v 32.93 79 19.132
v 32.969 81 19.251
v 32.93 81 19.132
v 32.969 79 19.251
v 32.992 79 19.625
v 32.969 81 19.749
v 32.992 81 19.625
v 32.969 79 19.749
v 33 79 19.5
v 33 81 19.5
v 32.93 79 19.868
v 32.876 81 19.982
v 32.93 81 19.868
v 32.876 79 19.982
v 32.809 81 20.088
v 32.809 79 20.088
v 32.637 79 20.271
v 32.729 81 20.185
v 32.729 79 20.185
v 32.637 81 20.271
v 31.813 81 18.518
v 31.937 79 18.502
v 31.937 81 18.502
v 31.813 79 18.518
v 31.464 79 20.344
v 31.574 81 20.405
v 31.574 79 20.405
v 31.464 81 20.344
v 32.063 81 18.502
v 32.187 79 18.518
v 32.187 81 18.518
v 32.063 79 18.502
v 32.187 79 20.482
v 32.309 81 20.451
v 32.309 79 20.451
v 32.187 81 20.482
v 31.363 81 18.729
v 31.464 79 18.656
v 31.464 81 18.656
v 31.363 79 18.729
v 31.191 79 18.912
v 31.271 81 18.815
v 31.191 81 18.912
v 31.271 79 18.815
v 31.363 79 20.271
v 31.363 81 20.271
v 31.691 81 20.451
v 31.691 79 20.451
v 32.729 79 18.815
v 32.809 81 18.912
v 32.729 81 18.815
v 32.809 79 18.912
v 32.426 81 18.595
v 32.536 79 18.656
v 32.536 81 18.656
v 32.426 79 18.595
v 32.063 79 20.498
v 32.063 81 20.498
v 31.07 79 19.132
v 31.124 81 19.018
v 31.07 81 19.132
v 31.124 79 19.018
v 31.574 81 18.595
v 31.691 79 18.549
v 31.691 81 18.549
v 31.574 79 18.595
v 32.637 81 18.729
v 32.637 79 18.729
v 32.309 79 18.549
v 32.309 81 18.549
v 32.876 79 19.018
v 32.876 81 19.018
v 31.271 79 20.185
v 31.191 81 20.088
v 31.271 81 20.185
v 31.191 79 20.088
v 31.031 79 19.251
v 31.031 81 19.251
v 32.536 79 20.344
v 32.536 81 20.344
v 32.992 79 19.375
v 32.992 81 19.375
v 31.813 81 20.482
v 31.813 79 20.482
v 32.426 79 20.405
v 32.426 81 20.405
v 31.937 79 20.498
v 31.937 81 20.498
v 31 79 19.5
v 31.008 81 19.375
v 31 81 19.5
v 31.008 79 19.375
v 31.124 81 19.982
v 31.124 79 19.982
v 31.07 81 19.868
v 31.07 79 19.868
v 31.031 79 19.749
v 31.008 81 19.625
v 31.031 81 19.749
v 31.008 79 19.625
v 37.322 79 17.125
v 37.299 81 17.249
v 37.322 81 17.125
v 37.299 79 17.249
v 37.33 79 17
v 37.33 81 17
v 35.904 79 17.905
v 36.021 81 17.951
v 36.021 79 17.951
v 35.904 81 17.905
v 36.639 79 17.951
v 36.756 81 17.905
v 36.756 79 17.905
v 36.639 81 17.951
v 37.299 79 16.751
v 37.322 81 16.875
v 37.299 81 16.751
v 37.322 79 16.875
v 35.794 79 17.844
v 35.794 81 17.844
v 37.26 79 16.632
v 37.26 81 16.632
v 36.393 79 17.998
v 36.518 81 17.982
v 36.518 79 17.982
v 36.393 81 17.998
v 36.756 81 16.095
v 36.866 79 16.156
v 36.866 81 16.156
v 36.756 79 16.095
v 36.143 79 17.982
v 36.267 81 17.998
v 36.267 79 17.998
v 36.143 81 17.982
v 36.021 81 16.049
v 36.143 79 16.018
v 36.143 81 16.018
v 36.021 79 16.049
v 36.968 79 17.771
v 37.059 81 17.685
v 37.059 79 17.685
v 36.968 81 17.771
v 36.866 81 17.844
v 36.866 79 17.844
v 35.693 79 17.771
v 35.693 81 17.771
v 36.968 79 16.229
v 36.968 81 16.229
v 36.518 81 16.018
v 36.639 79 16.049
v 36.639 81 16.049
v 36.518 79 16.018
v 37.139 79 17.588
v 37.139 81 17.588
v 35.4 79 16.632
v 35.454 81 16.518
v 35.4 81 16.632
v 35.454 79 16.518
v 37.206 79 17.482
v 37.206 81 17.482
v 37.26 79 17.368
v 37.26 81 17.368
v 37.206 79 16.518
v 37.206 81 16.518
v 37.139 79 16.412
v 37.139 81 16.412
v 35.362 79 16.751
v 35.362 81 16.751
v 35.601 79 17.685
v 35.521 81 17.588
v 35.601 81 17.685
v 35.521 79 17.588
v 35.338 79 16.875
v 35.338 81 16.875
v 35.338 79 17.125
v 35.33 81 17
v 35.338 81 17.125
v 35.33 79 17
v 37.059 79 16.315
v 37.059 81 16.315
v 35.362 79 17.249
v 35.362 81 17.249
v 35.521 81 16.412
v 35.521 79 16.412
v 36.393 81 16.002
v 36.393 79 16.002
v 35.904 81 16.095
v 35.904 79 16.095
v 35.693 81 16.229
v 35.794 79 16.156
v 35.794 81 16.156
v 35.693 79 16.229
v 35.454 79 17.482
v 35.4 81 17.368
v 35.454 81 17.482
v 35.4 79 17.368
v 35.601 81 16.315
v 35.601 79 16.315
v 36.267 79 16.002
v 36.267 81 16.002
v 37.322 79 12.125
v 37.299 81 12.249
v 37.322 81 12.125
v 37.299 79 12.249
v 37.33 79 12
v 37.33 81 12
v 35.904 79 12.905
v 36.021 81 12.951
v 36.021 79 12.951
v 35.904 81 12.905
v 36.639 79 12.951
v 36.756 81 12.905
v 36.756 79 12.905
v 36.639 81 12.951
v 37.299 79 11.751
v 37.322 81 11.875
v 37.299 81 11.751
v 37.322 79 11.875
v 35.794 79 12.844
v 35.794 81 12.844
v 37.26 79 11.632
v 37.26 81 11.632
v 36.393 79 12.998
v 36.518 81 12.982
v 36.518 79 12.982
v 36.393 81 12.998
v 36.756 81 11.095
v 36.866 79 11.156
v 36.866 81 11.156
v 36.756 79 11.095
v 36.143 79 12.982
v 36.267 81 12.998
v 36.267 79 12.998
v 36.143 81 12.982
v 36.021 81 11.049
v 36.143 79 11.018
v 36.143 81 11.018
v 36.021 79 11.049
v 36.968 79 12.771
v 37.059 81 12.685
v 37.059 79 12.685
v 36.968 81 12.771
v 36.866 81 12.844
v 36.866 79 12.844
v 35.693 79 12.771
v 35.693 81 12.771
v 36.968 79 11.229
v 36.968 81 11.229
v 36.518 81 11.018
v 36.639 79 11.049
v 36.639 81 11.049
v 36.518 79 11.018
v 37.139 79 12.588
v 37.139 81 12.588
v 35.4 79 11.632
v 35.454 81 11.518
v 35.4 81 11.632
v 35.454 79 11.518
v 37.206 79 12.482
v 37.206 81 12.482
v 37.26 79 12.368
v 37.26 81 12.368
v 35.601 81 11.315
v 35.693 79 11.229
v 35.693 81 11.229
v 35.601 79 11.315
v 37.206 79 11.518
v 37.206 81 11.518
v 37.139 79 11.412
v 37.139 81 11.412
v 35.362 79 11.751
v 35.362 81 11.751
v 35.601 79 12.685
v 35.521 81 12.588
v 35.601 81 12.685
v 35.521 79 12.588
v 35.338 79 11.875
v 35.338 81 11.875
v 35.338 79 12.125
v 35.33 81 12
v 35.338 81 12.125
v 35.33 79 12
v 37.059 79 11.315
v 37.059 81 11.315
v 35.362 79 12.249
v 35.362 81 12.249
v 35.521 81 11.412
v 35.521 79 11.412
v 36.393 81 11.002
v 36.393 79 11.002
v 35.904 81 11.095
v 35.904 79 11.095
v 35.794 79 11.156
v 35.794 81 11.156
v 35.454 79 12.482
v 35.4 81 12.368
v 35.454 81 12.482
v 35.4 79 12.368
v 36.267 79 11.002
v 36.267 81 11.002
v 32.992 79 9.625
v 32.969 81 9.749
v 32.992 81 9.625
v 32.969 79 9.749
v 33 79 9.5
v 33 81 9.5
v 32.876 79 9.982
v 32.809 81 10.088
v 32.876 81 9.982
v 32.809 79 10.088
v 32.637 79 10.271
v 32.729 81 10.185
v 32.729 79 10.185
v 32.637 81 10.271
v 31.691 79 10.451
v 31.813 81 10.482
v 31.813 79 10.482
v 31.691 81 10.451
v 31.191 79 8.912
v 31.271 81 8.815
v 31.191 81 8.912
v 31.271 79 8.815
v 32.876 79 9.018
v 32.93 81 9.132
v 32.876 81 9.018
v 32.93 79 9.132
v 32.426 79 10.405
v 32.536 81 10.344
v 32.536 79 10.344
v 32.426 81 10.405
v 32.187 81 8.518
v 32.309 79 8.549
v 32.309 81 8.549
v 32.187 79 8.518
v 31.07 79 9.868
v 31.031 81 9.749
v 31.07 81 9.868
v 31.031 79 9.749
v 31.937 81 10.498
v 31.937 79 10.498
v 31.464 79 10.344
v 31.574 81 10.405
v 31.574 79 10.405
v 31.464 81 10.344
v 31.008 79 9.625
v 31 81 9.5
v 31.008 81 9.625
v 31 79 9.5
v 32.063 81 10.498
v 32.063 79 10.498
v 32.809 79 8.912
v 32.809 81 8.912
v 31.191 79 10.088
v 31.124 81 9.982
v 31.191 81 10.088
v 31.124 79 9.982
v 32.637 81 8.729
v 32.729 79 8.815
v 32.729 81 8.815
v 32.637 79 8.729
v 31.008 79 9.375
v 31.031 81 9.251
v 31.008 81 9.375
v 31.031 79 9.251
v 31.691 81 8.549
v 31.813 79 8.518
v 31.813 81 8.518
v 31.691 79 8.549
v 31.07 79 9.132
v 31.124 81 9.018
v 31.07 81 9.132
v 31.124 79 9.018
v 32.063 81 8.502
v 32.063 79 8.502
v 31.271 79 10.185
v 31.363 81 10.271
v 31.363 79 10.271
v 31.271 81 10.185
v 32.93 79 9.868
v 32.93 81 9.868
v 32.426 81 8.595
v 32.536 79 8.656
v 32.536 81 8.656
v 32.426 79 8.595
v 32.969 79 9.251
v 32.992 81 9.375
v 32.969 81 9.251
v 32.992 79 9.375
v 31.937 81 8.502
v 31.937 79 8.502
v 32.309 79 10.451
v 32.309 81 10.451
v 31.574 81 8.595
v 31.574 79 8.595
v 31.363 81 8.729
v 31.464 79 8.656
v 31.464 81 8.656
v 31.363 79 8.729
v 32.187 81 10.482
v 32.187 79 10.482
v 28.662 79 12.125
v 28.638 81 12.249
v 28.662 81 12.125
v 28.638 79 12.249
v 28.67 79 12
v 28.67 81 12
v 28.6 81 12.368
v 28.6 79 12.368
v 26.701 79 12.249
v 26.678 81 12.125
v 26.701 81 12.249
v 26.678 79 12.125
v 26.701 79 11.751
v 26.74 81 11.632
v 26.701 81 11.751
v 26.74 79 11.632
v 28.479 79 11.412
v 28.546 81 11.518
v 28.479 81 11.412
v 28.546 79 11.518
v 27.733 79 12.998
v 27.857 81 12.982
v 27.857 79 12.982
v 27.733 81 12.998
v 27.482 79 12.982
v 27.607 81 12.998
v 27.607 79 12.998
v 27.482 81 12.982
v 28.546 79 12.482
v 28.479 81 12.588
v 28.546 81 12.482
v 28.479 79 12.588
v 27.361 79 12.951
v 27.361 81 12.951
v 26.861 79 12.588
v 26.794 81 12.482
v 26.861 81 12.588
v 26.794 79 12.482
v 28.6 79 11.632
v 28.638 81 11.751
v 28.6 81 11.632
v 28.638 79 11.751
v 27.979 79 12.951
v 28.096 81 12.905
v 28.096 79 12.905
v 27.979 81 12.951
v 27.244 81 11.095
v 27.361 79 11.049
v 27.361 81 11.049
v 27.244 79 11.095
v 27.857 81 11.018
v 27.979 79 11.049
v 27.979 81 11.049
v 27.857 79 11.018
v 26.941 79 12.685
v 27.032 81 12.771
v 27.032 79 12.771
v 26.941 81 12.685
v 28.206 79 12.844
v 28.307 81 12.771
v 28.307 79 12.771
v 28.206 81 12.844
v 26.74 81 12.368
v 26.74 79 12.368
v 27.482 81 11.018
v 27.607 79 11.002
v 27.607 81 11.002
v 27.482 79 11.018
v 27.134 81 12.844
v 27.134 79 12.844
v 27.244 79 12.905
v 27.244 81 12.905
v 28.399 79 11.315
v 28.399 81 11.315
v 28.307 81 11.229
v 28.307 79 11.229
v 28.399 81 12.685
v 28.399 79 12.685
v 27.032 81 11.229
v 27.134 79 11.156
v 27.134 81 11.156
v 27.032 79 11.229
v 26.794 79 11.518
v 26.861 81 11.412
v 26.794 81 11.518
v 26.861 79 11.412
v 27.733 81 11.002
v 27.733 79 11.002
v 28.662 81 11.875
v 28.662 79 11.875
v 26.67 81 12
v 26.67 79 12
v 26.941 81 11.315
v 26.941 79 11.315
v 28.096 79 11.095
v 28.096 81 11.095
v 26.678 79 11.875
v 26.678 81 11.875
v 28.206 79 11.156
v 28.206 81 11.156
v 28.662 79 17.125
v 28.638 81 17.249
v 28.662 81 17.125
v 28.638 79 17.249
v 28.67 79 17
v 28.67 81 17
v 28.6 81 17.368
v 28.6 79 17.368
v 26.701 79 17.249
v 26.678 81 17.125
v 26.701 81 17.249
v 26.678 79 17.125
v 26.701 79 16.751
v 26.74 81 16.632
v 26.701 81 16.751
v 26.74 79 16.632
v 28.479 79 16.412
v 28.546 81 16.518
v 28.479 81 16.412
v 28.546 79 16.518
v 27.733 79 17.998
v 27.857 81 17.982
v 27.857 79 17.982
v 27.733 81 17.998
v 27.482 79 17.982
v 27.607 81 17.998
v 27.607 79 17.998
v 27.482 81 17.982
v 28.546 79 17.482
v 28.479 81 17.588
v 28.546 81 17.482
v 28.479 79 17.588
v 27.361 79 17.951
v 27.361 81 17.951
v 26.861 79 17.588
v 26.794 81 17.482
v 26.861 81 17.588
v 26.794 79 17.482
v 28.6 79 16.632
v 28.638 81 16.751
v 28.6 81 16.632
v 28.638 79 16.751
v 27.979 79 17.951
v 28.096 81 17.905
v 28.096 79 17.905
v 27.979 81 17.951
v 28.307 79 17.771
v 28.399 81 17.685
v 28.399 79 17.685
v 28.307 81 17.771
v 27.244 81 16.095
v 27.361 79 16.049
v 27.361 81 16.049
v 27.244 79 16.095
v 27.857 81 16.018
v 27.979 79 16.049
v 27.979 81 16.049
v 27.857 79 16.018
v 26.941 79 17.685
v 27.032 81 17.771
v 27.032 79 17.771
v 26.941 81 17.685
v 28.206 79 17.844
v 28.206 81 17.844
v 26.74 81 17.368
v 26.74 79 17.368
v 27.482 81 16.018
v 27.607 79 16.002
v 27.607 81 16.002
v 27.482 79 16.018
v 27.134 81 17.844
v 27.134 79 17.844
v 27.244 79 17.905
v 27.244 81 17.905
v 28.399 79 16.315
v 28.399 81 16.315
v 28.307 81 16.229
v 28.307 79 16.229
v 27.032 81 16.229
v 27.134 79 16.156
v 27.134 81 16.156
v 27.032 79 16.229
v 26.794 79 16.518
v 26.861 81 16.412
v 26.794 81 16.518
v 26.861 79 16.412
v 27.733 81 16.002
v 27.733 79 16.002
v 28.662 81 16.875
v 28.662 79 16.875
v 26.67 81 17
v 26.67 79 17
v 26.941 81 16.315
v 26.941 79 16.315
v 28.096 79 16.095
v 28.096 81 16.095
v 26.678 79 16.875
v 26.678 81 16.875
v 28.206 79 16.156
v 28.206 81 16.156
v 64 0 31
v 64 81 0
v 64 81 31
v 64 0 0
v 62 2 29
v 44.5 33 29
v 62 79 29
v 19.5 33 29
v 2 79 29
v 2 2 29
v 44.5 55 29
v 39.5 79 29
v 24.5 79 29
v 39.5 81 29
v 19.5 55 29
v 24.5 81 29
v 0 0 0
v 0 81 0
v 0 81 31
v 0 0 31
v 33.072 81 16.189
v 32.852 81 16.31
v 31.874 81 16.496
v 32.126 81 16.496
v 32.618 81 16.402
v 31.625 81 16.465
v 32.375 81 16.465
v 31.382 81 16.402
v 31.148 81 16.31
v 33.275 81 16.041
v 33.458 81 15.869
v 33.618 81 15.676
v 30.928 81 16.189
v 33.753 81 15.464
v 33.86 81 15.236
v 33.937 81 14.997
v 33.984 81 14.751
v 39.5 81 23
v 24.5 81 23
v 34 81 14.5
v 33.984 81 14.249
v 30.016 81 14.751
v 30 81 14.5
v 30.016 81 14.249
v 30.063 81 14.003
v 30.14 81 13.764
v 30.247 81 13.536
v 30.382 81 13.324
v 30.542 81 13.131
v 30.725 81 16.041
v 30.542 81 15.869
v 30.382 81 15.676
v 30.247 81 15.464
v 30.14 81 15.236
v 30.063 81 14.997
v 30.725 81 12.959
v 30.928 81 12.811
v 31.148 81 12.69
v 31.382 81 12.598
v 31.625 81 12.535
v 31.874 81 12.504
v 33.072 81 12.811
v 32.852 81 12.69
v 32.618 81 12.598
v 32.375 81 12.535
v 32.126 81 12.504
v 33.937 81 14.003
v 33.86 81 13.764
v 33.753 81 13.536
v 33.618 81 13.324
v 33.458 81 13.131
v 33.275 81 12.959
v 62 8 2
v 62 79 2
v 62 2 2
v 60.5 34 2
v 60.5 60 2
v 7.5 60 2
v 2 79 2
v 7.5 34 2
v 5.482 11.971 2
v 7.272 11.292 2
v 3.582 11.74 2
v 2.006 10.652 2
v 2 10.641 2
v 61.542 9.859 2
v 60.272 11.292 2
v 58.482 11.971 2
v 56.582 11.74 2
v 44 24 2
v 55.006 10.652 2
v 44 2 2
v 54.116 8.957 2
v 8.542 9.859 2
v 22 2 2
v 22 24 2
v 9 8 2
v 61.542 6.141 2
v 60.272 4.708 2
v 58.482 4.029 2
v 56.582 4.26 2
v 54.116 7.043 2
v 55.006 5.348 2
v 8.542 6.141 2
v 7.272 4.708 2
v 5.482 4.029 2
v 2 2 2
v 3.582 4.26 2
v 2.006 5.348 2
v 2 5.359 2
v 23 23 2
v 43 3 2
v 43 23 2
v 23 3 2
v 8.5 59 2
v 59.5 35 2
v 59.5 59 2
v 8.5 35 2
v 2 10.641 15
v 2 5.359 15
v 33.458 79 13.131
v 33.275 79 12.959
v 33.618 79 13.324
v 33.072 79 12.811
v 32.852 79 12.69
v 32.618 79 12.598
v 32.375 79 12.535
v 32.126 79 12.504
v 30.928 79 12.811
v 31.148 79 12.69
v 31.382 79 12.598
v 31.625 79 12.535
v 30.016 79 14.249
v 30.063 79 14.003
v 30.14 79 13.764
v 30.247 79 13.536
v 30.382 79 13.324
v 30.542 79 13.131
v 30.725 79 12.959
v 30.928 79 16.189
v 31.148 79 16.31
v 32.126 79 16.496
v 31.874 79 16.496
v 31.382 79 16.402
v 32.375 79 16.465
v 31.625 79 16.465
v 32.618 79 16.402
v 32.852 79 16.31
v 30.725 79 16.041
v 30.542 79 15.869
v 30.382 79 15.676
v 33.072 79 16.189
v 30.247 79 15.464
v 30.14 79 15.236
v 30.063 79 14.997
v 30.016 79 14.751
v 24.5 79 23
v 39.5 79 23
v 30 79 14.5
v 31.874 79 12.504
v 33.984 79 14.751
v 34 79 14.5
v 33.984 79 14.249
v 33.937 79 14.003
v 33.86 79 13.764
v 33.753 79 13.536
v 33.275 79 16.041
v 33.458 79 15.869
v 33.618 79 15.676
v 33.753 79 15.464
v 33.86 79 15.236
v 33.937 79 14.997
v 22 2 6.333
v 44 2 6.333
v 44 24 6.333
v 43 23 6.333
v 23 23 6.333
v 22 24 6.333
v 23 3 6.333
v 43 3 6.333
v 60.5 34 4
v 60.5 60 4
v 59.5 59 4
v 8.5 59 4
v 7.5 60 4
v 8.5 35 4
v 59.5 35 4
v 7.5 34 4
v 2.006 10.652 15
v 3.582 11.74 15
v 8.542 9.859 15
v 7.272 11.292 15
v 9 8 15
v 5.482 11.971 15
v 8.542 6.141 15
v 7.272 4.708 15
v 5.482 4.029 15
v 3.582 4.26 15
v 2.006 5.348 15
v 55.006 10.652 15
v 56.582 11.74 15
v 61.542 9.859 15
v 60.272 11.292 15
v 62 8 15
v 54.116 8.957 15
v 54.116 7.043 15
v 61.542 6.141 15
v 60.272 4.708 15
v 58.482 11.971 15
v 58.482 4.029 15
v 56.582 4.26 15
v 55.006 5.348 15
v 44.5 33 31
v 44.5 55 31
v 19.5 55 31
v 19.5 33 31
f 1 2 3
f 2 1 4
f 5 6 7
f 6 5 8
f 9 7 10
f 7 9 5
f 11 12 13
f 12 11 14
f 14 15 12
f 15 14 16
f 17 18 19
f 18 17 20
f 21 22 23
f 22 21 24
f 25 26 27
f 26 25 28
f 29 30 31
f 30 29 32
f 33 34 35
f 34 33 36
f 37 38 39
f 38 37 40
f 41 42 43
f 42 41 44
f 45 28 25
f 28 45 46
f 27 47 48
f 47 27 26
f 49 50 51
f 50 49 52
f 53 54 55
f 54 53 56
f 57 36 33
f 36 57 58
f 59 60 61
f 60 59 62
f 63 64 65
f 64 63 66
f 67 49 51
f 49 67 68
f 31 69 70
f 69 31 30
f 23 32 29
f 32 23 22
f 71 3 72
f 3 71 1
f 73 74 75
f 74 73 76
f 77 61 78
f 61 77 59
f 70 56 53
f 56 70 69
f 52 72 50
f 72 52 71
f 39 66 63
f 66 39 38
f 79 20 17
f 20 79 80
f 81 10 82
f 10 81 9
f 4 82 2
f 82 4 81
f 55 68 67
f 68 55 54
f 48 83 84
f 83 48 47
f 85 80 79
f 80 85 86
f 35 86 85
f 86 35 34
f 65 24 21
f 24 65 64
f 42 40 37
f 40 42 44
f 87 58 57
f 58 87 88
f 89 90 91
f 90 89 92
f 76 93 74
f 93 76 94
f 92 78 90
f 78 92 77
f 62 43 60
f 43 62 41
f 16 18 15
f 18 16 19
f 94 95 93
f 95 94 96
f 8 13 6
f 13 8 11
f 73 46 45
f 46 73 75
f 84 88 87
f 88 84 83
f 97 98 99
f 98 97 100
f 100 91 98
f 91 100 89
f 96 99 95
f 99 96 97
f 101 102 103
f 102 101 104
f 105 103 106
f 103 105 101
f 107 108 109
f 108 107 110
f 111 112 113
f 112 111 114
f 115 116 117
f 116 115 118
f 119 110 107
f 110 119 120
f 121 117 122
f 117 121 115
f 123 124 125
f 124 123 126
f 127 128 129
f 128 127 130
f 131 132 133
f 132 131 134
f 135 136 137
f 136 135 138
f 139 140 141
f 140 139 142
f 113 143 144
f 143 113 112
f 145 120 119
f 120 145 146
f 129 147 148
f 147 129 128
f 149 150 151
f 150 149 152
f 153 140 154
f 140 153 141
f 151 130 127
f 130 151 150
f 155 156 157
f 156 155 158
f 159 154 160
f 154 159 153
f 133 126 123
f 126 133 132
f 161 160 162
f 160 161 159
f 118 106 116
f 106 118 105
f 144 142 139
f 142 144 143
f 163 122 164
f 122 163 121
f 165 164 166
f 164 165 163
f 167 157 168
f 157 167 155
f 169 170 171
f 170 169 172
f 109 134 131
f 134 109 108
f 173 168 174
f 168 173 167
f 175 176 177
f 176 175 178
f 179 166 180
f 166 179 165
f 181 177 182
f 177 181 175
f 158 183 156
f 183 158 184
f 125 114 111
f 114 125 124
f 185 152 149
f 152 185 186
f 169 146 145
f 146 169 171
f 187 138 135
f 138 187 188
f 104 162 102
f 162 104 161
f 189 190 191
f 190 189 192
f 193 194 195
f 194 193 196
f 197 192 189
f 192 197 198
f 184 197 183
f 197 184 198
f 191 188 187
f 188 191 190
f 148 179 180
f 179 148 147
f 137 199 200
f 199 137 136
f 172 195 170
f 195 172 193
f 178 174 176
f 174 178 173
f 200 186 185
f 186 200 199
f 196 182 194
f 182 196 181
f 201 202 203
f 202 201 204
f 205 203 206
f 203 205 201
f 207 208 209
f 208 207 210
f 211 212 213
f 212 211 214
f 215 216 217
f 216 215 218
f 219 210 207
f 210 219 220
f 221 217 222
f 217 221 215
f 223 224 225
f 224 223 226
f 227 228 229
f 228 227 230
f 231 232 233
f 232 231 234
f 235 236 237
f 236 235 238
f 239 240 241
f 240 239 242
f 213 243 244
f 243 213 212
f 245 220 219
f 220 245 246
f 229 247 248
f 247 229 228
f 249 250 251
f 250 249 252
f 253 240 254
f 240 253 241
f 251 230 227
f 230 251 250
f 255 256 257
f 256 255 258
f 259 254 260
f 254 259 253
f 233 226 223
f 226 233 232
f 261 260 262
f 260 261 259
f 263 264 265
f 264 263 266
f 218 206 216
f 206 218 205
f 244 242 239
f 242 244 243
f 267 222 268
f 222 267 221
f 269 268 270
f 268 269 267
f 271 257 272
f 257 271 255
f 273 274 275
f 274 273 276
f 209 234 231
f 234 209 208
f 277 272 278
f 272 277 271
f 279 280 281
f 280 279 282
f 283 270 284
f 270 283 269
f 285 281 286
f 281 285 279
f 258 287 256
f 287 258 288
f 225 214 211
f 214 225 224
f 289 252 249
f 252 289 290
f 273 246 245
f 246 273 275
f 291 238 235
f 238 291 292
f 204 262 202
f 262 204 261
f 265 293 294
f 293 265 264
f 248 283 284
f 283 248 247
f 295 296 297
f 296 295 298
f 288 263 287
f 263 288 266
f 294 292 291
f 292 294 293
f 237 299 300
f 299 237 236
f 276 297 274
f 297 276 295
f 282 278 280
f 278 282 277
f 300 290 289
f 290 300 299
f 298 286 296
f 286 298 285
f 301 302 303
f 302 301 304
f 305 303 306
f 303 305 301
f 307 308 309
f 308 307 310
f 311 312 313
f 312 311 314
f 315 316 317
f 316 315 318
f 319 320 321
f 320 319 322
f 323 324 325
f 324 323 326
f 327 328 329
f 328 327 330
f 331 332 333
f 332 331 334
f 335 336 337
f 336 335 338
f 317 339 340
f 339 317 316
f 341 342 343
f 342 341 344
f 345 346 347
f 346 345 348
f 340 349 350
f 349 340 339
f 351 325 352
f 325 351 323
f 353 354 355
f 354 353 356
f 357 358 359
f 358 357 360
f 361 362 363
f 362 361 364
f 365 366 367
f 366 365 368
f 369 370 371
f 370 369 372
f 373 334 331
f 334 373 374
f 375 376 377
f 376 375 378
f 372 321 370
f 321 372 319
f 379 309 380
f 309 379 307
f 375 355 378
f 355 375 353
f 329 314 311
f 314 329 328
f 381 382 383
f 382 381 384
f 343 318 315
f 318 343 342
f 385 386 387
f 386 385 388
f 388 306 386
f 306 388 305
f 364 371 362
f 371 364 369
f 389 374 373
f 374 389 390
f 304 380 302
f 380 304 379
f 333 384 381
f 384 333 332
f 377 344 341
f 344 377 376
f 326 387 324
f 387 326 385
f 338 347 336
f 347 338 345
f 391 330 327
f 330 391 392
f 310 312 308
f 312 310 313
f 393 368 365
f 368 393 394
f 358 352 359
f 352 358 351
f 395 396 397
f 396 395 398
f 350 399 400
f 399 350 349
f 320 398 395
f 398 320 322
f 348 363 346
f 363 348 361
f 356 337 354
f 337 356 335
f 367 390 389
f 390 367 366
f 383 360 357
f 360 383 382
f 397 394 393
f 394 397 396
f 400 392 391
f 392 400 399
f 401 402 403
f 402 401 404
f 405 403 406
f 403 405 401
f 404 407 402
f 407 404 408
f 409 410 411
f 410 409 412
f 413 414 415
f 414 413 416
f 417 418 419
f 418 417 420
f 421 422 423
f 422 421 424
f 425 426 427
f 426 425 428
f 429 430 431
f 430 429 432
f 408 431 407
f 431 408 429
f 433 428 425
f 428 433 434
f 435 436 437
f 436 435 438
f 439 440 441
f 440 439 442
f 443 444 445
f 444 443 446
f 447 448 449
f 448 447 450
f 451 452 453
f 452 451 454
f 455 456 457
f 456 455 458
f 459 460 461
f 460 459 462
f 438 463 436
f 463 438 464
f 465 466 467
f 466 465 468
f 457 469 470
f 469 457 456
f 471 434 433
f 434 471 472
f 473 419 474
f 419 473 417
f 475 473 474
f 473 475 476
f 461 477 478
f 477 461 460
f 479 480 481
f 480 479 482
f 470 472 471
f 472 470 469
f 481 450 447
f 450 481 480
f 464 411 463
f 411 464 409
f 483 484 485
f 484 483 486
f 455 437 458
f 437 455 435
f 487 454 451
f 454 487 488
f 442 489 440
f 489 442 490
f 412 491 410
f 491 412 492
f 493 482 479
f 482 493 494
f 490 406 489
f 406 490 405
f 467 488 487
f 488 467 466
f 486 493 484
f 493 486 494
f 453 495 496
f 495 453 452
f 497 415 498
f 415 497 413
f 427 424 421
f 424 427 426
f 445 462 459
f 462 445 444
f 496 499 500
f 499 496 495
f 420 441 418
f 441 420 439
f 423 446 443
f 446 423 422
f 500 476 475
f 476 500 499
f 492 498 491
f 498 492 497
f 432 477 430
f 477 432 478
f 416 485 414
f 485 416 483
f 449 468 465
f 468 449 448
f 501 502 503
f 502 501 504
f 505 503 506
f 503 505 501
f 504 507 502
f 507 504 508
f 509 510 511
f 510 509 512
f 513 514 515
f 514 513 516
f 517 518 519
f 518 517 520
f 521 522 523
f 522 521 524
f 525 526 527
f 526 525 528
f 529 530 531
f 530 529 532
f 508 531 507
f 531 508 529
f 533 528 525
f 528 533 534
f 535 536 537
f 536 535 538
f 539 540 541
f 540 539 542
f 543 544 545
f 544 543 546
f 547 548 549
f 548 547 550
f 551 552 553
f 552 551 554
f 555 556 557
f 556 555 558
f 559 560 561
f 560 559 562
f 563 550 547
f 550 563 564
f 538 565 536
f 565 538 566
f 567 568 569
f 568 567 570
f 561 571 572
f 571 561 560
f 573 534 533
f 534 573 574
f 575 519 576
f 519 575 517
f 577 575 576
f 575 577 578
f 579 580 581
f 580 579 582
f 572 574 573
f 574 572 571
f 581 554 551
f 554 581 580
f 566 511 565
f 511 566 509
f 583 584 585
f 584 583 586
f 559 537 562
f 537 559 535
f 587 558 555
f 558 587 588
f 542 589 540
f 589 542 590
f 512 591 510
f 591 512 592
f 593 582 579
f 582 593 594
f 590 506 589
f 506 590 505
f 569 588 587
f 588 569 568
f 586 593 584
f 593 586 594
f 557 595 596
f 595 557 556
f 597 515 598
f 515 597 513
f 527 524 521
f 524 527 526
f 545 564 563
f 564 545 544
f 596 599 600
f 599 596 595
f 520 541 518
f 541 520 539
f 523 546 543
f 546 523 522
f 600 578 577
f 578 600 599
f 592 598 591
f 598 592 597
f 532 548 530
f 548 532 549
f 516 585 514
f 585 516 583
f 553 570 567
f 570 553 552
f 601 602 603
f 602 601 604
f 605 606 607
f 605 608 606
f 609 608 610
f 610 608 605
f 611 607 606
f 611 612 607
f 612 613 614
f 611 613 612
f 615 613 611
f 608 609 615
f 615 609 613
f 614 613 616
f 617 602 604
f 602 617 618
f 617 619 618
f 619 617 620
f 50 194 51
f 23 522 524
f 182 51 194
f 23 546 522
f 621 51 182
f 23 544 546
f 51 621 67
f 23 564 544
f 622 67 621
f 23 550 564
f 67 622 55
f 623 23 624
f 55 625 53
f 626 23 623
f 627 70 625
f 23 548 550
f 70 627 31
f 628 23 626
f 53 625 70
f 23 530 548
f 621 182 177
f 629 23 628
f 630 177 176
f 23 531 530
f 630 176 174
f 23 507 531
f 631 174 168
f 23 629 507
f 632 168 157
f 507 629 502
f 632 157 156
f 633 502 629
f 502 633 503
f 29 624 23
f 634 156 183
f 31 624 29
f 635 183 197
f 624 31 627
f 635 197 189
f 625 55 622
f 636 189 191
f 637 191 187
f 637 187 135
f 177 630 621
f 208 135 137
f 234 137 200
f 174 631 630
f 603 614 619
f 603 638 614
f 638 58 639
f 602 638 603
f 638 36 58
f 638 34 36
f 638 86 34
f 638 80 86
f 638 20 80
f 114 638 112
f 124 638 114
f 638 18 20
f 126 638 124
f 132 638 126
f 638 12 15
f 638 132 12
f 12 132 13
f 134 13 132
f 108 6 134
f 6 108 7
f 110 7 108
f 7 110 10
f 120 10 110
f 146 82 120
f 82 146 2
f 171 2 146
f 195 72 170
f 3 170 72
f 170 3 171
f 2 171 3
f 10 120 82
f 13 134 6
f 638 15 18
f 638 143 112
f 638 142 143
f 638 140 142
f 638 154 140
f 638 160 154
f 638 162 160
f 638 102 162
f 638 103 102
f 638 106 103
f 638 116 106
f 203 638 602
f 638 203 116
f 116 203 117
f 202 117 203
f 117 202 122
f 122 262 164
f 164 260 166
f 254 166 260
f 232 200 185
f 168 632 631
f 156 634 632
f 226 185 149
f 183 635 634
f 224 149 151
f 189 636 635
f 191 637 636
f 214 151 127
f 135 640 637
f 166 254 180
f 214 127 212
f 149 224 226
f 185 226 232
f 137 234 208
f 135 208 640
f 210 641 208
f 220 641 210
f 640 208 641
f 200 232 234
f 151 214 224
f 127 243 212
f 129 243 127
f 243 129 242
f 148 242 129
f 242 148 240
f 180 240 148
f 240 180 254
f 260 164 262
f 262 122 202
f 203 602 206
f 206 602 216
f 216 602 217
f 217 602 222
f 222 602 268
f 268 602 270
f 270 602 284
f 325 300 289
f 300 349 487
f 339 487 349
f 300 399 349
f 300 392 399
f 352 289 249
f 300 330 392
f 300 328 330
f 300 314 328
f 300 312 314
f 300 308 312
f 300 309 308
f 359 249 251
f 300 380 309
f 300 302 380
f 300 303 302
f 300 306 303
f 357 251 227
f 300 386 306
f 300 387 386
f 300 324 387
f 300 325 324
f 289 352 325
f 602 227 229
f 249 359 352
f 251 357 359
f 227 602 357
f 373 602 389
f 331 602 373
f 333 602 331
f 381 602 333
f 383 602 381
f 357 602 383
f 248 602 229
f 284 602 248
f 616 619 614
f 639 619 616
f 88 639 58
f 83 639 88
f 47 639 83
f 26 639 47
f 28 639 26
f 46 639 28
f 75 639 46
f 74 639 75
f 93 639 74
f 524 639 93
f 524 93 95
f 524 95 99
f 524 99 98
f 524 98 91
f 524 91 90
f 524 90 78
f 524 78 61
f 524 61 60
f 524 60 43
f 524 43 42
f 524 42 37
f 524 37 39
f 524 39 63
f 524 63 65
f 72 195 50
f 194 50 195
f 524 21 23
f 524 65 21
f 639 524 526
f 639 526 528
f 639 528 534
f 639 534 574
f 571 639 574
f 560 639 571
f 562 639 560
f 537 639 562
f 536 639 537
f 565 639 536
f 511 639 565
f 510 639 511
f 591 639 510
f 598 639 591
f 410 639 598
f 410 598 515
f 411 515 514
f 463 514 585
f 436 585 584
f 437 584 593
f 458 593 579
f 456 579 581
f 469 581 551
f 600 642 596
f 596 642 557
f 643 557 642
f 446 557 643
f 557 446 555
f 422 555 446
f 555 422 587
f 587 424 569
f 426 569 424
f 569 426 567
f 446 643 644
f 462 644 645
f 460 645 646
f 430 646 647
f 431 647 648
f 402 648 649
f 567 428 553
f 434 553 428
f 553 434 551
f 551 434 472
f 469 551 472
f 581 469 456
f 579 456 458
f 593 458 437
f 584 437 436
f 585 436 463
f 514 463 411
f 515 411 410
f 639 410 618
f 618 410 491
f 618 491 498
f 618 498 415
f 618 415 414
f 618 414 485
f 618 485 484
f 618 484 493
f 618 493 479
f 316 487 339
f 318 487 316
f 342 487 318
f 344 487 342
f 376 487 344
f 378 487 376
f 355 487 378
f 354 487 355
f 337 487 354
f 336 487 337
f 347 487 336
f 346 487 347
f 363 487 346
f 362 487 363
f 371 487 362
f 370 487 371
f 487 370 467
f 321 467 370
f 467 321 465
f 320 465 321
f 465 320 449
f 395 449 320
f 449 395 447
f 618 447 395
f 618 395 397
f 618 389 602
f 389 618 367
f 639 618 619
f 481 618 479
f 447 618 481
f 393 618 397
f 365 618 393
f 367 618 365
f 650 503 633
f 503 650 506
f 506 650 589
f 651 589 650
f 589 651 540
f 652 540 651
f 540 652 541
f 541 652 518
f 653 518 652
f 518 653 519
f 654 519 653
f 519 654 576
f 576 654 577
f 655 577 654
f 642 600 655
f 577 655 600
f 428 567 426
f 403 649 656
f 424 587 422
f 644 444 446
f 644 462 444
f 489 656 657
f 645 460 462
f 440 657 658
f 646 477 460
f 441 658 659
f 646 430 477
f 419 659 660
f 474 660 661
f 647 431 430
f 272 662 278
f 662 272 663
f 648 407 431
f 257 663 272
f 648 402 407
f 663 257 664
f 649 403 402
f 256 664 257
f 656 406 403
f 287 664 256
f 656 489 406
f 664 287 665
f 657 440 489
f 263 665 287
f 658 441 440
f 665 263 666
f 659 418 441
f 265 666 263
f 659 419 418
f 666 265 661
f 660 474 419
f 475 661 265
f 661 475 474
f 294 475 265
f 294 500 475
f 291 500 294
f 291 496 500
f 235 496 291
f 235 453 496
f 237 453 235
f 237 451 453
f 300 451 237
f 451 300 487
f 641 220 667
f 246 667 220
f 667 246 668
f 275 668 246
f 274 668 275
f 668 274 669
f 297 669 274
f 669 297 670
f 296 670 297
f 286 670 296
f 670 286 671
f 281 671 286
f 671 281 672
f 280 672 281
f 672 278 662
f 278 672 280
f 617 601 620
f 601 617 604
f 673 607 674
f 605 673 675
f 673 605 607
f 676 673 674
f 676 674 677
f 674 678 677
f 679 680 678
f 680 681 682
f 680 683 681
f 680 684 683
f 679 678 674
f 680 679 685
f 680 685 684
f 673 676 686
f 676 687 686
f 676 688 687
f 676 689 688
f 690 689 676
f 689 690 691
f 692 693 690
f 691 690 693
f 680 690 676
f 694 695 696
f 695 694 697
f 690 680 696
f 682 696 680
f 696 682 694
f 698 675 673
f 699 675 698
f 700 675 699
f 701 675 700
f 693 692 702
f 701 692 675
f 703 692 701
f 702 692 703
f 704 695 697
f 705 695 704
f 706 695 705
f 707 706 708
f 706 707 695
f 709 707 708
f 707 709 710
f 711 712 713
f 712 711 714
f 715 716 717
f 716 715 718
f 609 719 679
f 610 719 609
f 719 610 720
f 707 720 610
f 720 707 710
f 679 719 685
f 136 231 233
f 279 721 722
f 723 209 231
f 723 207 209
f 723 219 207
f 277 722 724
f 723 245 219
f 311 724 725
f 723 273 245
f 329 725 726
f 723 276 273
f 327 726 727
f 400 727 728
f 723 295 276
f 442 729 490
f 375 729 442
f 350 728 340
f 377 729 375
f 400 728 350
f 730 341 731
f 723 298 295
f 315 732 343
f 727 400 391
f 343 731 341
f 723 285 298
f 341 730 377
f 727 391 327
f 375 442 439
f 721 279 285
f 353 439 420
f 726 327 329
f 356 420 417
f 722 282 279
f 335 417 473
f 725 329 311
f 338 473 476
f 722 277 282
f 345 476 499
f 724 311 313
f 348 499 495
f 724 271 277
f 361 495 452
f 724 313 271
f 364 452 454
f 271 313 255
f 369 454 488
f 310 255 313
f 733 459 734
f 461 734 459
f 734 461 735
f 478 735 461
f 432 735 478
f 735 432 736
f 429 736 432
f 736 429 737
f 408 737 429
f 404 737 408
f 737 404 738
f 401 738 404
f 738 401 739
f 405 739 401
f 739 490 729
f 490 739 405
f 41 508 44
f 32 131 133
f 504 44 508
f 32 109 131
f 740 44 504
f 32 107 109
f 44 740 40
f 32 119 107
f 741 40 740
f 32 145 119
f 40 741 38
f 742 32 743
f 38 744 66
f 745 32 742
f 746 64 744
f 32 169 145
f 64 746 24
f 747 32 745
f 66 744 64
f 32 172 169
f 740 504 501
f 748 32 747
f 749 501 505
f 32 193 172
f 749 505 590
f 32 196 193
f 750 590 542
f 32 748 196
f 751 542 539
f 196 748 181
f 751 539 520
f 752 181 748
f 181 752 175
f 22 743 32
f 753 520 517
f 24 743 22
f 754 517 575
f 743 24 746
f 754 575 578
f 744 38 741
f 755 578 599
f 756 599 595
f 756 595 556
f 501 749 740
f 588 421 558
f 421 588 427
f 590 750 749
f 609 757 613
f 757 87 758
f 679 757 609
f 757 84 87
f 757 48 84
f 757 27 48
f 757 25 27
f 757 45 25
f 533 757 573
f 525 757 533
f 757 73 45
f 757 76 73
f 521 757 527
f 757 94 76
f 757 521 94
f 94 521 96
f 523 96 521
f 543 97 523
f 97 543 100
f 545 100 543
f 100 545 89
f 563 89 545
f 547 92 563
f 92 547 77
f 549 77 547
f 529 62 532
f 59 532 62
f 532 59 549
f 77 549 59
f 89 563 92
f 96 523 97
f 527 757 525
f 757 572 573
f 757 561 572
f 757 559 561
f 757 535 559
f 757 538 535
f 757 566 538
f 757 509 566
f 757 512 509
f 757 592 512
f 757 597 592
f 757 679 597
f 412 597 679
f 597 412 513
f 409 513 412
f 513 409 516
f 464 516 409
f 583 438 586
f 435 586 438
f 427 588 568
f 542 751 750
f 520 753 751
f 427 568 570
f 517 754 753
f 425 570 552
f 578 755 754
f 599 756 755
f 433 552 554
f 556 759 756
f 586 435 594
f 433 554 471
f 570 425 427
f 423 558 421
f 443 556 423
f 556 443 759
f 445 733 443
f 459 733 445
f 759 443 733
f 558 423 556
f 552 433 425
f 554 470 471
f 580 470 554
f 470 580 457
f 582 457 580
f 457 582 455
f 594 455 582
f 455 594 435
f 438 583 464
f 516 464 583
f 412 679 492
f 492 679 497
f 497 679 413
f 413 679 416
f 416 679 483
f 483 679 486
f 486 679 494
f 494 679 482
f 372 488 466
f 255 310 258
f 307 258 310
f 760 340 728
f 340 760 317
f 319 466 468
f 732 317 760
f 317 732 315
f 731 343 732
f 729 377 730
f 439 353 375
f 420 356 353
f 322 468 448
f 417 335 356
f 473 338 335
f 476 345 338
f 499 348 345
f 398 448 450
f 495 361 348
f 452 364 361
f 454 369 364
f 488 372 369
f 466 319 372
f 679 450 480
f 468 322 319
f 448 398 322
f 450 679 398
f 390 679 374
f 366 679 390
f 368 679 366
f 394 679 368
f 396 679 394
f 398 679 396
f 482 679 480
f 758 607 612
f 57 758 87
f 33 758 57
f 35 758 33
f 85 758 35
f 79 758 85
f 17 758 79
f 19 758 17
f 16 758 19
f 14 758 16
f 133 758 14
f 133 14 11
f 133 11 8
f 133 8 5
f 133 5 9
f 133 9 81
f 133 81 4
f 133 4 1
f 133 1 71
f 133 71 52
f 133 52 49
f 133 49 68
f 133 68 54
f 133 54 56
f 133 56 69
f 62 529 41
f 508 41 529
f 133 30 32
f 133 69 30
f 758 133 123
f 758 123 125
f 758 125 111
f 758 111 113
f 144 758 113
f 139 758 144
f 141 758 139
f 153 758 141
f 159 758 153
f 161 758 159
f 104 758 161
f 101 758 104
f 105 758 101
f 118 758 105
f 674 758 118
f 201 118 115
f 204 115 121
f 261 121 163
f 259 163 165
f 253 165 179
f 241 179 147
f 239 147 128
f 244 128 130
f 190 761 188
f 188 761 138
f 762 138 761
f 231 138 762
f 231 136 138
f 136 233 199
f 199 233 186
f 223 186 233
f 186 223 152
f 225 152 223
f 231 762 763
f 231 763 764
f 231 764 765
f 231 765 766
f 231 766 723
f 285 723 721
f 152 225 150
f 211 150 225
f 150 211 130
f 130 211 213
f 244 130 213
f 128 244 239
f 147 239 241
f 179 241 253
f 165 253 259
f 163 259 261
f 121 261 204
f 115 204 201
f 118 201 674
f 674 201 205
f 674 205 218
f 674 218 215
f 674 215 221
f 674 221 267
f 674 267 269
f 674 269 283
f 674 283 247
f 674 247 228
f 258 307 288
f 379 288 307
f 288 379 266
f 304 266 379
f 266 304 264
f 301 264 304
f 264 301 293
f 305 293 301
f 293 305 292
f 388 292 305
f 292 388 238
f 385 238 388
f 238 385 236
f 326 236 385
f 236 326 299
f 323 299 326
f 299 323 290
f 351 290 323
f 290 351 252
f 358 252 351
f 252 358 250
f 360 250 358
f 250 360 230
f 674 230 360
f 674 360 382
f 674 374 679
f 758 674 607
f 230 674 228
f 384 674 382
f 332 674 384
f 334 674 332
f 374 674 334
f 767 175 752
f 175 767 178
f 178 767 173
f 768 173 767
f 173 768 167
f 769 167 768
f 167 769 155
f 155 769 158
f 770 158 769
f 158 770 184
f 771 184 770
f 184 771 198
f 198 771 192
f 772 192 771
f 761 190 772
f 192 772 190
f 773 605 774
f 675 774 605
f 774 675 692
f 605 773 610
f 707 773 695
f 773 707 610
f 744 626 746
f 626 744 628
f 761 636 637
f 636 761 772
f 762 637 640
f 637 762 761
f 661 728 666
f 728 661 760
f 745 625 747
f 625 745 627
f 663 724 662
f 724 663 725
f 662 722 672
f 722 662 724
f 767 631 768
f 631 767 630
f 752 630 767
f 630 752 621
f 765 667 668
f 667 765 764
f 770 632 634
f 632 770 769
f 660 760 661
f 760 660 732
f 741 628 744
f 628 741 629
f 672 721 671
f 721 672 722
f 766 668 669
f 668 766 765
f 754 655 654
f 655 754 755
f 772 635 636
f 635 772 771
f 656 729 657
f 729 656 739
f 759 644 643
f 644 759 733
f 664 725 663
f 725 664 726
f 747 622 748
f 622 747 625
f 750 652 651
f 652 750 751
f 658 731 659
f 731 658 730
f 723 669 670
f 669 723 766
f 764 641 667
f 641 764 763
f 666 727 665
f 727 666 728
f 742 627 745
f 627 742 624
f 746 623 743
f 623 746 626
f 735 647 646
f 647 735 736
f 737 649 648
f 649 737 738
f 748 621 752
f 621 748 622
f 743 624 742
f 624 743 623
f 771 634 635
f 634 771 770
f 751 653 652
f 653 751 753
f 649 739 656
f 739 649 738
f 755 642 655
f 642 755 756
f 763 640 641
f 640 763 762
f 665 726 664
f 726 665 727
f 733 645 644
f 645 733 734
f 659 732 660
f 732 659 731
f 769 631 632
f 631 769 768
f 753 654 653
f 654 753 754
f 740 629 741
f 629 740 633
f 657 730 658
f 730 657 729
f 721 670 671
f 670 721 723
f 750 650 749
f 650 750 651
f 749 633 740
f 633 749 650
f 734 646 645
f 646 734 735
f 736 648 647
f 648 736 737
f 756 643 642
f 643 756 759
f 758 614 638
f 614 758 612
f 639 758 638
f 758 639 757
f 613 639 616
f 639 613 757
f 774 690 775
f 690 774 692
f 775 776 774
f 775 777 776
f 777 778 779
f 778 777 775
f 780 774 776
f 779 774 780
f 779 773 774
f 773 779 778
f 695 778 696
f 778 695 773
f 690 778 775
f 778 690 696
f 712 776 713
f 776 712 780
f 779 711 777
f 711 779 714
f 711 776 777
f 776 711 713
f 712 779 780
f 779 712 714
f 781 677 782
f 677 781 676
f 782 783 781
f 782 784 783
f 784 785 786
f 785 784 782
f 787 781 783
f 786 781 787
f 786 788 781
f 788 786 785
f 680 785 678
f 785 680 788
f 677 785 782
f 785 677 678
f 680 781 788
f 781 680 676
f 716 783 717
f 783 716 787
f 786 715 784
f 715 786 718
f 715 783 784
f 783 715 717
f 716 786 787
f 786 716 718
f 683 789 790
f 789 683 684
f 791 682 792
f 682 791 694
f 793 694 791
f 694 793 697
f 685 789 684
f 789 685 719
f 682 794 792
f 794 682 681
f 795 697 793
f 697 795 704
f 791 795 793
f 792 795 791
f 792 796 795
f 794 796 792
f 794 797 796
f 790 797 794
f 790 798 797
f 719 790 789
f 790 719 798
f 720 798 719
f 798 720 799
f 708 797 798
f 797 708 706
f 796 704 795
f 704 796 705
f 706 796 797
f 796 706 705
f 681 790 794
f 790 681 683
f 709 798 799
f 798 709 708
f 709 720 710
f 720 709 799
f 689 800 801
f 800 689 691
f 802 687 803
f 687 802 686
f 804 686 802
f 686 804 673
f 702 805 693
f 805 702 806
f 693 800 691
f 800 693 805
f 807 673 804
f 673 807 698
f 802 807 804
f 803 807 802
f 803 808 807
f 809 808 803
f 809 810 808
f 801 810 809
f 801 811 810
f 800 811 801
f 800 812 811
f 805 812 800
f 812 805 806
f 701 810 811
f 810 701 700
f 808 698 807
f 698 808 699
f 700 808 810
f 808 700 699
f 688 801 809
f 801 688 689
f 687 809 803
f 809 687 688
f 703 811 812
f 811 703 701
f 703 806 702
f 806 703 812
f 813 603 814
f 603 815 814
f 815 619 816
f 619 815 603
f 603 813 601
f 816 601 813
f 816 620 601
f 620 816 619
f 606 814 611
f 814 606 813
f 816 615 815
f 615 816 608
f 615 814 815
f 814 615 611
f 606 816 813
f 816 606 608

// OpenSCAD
// valeur en millimètre
boitier_pile_hauteur = 16;
boitier_pile_longueur = 53;
boitier_pile_largeur = 26;
boitier_pile_emplacement_epaisseur = 2;

connecteur_edge_hauteur = 11.8;
connecteur_edge_longueur = 40;
connecteur_edge_largeur = 60;
connecteur_percage_bord_bas = 6;
connecteur_percage_bord_lat = 3;
connecteur_percage_diametre = 2;

microbit_largueur = 44;
microbit_longueur = 52;
microbit_hauteur = 9;

microbit_enfiche_connector = 7;

vibreur_boite_epaisseur = 2;
vibreur_largeur = 20;
vibreur_longueur = 20;
vibreur_hauteur = 13;

boitier_epaisseur = 2; 
boitier_complet_largeur = connecteur_edge_largeur + (boitier_epaisseur * 2);
boitier_complet_longueur = connecteur_edge_longueur - microbit_enfiche_connector +  microbit_largueur + (boitier_epaisseur * 2);
boitier_complet_hauteur = 25 + (boitier_epaisseur * 2);

module fond() {
    difference() {
        cube([boitier_complet_largeur, boitier_complet_longueur, boitier_complet_hauteur]);
        translate([boitier_epaisseur, boitier_epaisseur, boitier_epaisseur])
            cube([boitier_complet_largeur - (boitier_epaisseur * 2),
                    boitier_complet_longueur- (boitier_epaisseur * 2),
                    boitier_complet_hauteur]);
        // trous sonores au fond
        translate([boitier_complet_largeur / 2, boitier_complet_longueur + 1 , boitier_complet_hauteur / 2])
            rotate([90,0,0])
            cylinder($fn=50, h=4, r=2);
        // autres trous sonores
        translate([boitier_complet_largeur / 2,
                    boitier_complet_longueur + 1,
                    boitier_complet_hauteur / 2])
        rotate([90,0,0])
            for (i = [0:5]) {
                translate([sin(360*i/6)*5,
                        cos(360*i/6)*5,
                        0])
                    cylinder($fn=50, h=4, r=1);
        }
        // trou USB
        translate([boitier_complet_largeur / 2 - 7.5, boitier_complet_longueur - 3 , boitier_complet_hauteur - 6])
            cube([15, 4, 7]);
    }
    // cube([boitier_complet_largeur, boitier_complet_longueur,boitier_epaisseur]);
}

module support_vibreur() {
    difference() {
        translate([boitier_complet_largeur / 2 - (vibreur_largeur / 2),
                boitier_epaisseur,  // + vibreur_boite_epaisseur,
                vibreur_boite_epaisseur])
                    color("red")
                        cube([vibreur_largeur + vibreur_boite_epaisseur,
                            vibreur_longueur + vibreur_boite_epaisseur,
                            vibreur_hauteur / 3]);
        translate([boitier_complet_largeur / 2 - (vibreur_largeur / 2) + vibreur_boite_epaisseur / 2, 
                boitier_epaisseur + 1,  // + vibreur_boite_epaisseur,
                vibreur_boite_epaisseur -1 ])
                        cube([vibreur_largeur,
                            vibreur_longueur,
                            vibreur_hauteur + 2]);
        
    }
    
//    translate([boitier_complet_largeur / 2 - (vibreur_largeur / 2), boitier_epaisseur + vibreur_boite_epaisseur,
//   boitier_epaisseur])
//        color("red")
//        cube([vibreur_largeur + vibreur_boite_epaisseur, vibreur_longueur + vibreur_boite_epaisseur, vibreur_hauteur]);
}

module support_boitier_pile() {
    difference() {
        translate([boitier_complet_largeur / 2 - (boitier_pile_longueur / 2) + boitier_epaisseur,
                    30 + boitier_epaisseur + boitier_pile_emplacement_epaisseur,
                    boitier_epaisseur])
            color("green")
                cube([boitier_pile_longueur,
                    boitier_pile_largeur,
                    boitier_pile_emplacement_epaisseur]);
        
        translate([boitier_complet_largeur / 2 - (boitier_pile_longueur / 2) + boitier_epaisseur +boitier_pile_emplacement_epaisseur / 2,
            30 + boitier_epaisseur + boitier_pile_emplacement_epaisseur + boitier_pile_emplacement_epaisseur / 2,
            boitier_epaisseur])
                cube([boitier_pile_longueur - boitier_pile_emplacement_epaisseur,
                    boitier_pile_largeur - boitier_pile_emplacement_epaisseur,
                    boitier_pile_emplacement_epaisseur + 1]);
    }
}

module support_connector_edge() {
    translate([connecteur_percage_bord_lat + boitier_epaisseur, connecteur_percage_bord_bas + boitier_epaisseur, boitier_epaisseur])
        color("blue")
        cylinder(h=13, r=connecteur_percage_diametre + 2);
    translate([connecteur_percage_bord_lat + boitier_epaisseur + 53, connecteur_percage_bord_bas + boitier_epaisseur, boitier_epaisseur])
        color("blue")
        cylinder(h=13, r=connecteur_percage_diametre + 2);
}

module couvercle() {
    difference() {
        translate([0, 0, boitier_complet_hauteur])
            color("orange")
                cube([boitier_complet_largeur, boitier_complet_longueur, boitier_epaisseur]);
        translate([boitier_complet_largeur / 2 - 25 / 2,
                    connecteur_edge_longueur + 2 + + 2 - 22 / 2,
                    boitier_complet_hauteur - 1])
            cube([25,  // largeur zone LED
                  22, // longueur zone LE,
                  boitier_epaisseur +  2]);
    }
}

union() {
    fond();
    support_vibreur();
    support_boitier_pile();
    support_connector_edge();
    couvercle();
    //!couvercle();  // pour imprimer le couvercle
}
